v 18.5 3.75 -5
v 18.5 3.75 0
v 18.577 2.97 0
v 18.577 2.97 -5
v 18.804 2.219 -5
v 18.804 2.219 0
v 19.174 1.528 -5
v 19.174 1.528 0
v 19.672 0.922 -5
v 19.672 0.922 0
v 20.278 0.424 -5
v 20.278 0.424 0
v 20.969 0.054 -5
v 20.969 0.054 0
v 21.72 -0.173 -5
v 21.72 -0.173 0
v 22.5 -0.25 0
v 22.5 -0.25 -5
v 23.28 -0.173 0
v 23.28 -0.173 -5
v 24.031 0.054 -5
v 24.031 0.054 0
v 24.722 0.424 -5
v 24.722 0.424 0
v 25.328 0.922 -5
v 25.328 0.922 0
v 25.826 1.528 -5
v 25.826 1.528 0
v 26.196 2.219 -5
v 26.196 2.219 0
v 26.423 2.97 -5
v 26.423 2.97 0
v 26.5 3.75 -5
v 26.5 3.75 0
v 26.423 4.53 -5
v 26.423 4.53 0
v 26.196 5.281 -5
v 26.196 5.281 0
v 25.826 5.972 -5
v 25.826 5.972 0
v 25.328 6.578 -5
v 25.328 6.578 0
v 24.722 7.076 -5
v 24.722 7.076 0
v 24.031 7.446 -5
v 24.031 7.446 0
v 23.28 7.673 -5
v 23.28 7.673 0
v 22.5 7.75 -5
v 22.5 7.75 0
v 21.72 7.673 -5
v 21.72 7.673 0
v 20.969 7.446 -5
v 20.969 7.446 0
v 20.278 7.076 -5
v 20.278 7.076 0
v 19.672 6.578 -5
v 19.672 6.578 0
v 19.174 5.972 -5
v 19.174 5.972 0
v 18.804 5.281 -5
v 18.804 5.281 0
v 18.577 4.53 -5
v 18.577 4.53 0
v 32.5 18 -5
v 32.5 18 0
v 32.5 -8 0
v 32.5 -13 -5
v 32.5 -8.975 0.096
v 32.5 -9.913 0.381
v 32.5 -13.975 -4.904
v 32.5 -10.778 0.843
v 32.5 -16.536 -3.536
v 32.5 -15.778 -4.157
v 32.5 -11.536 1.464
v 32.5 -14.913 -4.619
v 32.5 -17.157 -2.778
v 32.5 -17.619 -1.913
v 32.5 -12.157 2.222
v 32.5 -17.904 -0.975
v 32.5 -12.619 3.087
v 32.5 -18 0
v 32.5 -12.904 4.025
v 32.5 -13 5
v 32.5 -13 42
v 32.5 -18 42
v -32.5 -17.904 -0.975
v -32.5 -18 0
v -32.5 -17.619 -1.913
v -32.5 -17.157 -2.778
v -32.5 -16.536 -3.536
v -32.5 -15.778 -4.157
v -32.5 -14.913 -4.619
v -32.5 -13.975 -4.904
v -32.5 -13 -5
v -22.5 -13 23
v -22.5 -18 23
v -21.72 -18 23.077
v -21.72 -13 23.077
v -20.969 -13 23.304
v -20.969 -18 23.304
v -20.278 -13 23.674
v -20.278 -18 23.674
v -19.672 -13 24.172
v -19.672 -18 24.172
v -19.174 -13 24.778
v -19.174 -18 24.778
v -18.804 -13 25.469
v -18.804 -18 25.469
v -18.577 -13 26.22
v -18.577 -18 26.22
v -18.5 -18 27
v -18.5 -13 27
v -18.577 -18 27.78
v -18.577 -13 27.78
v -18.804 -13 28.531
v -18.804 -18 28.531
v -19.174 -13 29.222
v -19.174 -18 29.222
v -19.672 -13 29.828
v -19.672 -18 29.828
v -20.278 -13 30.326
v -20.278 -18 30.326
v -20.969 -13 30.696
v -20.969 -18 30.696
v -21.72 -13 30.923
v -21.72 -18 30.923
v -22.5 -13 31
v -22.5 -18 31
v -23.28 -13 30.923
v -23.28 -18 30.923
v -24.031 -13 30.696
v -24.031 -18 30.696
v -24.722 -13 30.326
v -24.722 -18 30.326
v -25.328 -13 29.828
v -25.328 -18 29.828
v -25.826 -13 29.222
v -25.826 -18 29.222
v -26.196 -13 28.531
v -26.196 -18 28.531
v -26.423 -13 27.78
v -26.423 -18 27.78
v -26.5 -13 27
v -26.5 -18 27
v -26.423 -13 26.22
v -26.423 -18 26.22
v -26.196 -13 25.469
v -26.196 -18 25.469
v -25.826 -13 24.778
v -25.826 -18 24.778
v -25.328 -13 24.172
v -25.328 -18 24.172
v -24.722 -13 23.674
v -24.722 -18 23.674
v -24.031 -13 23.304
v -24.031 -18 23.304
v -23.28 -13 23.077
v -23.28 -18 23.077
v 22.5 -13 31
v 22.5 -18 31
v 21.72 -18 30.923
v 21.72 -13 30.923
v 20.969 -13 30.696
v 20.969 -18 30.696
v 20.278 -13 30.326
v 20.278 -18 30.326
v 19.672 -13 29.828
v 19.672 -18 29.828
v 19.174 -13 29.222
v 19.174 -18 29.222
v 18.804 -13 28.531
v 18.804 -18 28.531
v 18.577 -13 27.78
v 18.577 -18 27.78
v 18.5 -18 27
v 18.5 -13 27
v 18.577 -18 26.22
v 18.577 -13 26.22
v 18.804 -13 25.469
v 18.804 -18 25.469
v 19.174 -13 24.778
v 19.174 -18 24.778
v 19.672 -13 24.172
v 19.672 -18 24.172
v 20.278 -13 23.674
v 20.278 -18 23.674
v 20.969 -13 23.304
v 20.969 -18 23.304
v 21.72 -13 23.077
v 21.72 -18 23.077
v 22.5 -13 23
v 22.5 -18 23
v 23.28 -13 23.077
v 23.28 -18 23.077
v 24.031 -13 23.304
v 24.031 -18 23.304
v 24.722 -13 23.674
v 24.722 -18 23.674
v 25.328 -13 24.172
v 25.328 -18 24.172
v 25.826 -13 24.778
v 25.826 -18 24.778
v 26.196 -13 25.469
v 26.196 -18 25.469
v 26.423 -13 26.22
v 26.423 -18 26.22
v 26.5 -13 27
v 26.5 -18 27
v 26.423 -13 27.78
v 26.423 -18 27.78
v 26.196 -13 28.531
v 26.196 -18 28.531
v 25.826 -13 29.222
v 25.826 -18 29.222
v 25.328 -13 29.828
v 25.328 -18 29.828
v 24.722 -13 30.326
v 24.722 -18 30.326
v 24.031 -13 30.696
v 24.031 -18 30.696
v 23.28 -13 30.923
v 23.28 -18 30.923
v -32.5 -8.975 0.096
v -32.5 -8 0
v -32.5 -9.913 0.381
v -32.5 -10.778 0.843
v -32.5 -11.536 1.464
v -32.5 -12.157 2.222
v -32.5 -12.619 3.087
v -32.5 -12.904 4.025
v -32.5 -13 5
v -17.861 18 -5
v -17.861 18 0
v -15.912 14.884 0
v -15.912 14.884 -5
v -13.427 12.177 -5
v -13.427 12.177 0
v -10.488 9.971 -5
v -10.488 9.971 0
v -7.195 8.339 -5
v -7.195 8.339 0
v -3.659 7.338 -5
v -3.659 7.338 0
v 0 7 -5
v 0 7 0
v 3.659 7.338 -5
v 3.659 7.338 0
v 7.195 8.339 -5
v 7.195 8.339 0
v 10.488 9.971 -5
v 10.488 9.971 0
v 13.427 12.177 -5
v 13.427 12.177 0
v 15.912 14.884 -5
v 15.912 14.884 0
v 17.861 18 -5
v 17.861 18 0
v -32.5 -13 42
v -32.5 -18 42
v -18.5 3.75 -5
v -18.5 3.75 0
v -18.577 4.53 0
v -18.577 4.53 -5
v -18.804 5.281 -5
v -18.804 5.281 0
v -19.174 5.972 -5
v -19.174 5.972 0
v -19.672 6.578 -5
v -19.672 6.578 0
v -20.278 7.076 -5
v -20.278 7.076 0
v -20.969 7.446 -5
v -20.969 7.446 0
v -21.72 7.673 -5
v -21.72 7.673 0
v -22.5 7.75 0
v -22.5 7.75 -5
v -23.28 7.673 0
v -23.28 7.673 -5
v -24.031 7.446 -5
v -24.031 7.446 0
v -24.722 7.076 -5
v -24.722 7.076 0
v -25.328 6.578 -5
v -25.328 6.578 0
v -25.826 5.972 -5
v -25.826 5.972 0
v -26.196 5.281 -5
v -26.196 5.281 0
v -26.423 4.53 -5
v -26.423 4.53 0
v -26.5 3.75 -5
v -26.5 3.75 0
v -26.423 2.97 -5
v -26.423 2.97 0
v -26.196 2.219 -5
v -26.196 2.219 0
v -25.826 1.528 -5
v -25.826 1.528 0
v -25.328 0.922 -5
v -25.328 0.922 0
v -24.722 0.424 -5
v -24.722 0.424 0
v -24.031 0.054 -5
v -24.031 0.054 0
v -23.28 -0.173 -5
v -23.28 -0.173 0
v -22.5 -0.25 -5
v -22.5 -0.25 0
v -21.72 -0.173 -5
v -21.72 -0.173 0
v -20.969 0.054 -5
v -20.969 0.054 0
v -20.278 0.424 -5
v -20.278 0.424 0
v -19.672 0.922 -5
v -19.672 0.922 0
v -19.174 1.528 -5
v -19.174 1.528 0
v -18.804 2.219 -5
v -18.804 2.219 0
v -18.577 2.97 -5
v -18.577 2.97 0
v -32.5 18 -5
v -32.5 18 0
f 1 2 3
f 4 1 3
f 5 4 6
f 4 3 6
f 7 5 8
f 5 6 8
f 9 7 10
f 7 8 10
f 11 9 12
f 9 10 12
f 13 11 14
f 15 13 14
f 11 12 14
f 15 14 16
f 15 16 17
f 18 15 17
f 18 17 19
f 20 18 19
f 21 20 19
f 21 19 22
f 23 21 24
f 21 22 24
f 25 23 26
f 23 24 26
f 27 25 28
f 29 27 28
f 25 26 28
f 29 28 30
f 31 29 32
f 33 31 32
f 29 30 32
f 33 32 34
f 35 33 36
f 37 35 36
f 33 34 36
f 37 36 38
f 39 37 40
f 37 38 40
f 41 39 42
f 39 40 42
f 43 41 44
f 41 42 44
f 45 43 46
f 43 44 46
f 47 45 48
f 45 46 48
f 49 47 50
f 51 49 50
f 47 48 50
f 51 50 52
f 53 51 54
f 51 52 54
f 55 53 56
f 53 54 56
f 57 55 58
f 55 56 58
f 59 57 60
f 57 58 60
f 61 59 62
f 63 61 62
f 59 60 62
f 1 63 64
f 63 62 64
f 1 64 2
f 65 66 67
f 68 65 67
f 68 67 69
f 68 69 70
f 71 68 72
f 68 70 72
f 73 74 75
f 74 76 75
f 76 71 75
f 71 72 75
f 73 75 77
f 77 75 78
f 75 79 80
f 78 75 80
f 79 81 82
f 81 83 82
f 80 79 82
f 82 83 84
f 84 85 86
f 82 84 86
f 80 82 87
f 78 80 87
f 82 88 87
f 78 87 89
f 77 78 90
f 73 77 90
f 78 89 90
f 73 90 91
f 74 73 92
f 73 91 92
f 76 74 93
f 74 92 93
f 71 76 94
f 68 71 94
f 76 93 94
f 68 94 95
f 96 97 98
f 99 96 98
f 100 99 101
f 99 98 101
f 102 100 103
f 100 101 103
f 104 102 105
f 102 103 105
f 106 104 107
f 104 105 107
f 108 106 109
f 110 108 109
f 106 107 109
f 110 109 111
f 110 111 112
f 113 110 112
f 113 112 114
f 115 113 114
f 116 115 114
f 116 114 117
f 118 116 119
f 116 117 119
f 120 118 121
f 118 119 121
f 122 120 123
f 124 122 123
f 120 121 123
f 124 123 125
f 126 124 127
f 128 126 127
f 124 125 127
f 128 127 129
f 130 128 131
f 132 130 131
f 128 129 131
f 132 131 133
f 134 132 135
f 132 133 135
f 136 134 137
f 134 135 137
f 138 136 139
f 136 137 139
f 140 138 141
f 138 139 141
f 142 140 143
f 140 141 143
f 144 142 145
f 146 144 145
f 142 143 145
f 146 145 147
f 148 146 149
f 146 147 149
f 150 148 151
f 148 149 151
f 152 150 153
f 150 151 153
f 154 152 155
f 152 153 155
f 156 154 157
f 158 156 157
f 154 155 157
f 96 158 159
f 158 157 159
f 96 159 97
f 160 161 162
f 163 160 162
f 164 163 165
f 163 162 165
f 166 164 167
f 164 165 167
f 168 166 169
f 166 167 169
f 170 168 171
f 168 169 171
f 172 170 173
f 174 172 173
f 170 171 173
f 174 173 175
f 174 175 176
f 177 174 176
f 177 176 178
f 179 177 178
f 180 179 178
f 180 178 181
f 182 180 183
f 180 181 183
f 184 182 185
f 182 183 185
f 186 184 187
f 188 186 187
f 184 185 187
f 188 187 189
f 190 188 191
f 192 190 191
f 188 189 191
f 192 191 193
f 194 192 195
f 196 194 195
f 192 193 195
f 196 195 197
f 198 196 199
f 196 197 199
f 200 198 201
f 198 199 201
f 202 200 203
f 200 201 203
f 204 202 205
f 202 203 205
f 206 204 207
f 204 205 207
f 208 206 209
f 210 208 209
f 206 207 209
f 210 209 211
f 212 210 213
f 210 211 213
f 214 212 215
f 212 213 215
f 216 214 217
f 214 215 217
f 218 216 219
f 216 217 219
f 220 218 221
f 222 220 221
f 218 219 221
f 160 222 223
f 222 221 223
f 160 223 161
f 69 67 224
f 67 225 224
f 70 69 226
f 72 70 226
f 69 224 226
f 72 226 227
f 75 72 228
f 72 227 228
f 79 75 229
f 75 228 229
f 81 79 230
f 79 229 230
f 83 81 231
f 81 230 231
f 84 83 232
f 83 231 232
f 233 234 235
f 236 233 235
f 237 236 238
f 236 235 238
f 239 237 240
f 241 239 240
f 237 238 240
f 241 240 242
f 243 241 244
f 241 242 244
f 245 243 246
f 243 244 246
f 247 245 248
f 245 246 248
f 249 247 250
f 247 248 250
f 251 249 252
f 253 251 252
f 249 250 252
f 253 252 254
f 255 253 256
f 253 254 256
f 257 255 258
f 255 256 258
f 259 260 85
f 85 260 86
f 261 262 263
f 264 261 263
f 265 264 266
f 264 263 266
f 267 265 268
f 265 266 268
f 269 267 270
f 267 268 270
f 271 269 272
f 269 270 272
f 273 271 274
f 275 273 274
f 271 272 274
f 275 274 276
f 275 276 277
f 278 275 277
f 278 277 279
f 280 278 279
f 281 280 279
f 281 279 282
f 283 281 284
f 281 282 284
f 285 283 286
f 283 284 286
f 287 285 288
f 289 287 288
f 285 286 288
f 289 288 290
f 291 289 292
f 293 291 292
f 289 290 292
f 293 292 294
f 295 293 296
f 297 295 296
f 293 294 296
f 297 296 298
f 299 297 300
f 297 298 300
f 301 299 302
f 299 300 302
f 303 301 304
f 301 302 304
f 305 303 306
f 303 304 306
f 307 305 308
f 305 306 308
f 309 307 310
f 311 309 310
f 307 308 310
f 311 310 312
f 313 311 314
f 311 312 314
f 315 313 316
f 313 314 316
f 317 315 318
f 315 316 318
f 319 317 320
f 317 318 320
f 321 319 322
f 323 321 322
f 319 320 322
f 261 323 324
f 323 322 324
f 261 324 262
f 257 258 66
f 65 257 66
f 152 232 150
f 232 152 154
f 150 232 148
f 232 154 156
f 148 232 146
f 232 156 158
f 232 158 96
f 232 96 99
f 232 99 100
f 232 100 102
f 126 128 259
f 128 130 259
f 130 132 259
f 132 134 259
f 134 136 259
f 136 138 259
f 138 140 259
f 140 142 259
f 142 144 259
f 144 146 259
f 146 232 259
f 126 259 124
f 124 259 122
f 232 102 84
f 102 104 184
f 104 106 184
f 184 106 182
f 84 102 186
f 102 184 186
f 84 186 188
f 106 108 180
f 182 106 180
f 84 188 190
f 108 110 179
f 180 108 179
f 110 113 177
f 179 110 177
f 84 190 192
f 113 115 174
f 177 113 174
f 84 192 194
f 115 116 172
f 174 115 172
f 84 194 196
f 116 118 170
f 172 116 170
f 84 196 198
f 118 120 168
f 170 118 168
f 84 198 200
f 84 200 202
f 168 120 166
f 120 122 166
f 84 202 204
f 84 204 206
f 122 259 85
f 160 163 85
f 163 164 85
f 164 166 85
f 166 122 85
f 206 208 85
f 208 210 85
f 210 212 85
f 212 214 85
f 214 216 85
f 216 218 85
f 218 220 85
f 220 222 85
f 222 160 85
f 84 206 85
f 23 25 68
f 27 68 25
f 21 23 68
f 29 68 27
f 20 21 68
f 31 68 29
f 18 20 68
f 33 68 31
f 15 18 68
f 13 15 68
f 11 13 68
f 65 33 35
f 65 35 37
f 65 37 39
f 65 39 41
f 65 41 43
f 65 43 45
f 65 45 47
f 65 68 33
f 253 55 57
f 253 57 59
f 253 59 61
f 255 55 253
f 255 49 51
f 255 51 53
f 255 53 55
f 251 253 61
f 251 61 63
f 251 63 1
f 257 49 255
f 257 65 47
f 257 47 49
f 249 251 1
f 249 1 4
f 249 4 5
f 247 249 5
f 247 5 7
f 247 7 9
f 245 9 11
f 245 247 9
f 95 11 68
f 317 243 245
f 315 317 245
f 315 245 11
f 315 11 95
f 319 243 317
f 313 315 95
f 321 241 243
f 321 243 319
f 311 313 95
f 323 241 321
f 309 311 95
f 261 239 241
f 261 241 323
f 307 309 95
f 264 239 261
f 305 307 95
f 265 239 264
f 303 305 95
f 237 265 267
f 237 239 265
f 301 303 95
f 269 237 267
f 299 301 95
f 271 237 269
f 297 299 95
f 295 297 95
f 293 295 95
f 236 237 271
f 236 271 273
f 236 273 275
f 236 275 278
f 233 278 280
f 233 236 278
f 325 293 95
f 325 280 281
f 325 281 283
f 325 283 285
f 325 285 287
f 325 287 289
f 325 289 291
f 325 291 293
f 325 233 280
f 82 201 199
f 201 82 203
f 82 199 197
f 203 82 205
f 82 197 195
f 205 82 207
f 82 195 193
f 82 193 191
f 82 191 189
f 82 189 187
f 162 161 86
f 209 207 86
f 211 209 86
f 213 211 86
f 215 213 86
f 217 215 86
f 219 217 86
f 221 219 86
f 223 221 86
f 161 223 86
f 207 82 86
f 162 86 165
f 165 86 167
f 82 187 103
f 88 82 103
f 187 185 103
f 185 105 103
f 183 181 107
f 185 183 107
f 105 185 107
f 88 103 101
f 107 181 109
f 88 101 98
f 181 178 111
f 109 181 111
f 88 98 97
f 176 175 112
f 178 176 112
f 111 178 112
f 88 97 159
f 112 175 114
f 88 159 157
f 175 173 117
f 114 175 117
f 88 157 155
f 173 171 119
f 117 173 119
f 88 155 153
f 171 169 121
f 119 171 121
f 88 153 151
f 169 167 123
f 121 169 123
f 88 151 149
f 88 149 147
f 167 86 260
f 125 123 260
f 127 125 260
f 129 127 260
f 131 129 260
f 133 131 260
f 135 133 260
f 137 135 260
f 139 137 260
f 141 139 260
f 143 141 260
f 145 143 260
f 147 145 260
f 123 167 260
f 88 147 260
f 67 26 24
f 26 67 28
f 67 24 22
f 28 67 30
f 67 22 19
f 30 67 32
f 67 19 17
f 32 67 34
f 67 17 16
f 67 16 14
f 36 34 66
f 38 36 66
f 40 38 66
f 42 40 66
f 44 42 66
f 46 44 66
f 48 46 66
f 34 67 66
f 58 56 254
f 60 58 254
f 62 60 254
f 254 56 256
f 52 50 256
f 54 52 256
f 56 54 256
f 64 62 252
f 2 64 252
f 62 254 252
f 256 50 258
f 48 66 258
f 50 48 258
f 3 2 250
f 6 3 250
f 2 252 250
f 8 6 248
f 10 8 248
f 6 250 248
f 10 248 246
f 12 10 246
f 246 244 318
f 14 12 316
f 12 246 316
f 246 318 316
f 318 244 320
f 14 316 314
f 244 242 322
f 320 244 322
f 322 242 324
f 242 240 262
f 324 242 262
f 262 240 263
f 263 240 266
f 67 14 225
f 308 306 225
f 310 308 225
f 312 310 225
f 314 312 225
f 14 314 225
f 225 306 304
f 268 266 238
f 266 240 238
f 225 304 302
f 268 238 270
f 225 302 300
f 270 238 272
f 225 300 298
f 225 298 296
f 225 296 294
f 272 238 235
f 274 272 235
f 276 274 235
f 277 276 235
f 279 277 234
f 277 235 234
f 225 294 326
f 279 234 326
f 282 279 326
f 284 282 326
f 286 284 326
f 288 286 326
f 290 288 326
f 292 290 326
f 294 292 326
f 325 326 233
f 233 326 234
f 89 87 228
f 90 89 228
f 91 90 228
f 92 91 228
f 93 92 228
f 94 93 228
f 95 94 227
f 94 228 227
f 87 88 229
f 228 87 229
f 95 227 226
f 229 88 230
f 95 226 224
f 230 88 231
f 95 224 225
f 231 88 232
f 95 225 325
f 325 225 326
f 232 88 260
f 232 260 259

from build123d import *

# Parameters (mm, degrees)
SZKIC1_R                    = 4
DODANIE_WYCI_GNI_CIE1_DEPTH = 5
SZKIC2_W                    = 65
SZKIC2_H                    = 47
SZKIC2_R                    = 4
DODANIE_WYCI_GNI_CIE2_DEPTH = 5
ZAOKR_GLENIE1_R             = 5
ZAOKR_GLENIE2_R             = 5


with BuildPart() as part:
    # Szkic1 → Dodanie-wyciągnięcie1 (new body)
    with BuildSketch(Plane.XY):
        with BuildLine():
            Line((17.860571099, 18), (32.5, 18))
            Line((32.5, 18), (32.5, -18))
            Line((32.5, -18), (-32.5, -18))
            Line((-32.5, -18), (-32.5, 18))
            Line((-32.5, 18), (-17.860571099, 18))
            ThreePointArc((-17.860571099, 18), (0, 7), (17.860571099, 18))
        make_face()
        with Locations((-22.5, 3.75)):
            Circle(SZKIC1_R, mode=Mode.SUBTRACT)
        with Locations(Location((22.5, 3.75, 0), (0, 0, 180))):
            Circle(SZKIC1_R, mode=Mode.SUBTRACT)
    extrude(amount=-DODANIE_WYCI_GNI_CIE1_DEPTH)

    # Szkic2 → Dodanie-wyciągnięcie2 (add)
    with BuildSketch(Plane.XZ.offset(18)):
        with Locations((0, 18.5)):
            Rectangle(SZKIC2_W, SZKIC2_H)
        with Locations(Location((-22.5, 27, 0), (0, 0, 270))):
            Circle(SZKIC2_R, mode=Mode.SUBTRACT)
        with Locations(Location((22.5, 27, 0), (0, 0, 90))):
            Circle(SZKIC2_R, mode=Mode.SUBTRACT)
    extrude(amount=-DODANIE_WYCI_GNI_CIE2_DEPTH)

    # Zaokrąglenie1
    zaokr_glenie1_edges = [part.edges().sort_by_distance(p)[0] for p in [
        (0, -13, 0),
    ]]
    fillet(zaokr_glenie1_edges, radius=ZAOKR_GLENIE1_R)

    # Zaokrąglenie2
    zaokr_glenie2_edges = [part.edges().sort_by_distance(p)[0] for p in [
        (0, -18, -5),
    ]]
    fillet(zaokr_glenie2_edges, radius=ZAOKR_GLENIE2_R)


solid = part.part
